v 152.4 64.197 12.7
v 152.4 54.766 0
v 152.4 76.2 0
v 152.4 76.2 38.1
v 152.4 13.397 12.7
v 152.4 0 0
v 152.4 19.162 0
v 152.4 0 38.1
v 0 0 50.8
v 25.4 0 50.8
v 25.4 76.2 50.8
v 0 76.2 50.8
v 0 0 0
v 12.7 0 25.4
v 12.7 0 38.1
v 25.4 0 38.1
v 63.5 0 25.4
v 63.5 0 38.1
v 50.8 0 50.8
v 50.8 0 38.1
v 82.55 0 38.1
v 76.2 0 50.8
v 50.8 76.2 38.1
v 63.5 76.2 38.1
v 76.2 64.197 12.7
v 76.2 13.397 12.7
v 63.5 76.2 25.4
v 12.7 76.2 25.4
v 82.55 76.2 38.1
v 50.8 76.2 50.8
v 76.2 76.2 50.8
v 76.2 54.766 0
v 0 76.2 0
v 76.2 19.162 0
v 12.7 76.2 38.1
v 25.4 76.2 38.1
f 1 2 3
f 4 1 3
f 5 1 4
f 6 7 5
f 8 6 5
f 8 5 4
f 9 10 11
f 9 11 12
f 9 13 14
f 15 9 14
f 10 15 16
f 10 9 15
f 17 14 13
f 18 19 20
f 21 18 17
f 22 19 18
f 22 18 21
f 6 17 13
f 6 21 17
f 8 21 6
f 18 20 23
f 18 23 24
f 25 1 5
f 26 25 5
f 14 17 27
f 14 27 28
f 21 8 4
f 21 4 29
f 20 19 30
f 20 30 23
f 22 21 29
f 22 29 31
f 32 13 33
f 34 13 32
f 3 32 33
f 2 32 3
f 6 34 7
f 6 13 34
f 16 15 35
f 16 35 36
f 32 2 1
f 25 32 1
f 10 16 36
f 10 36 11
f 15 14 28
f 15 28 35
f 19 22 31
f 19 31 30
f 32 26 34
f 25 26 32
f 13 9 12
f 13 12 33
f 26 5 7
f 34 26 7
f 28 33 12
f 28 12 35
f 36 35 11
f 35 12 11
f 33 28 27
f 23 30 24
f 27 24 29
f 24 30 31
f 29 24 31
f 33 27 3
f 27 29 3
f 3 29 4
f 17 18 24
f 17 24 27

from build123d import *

# Parameters (mm, degrees)
F1_DEPTH = 76.2
F3_DEPTH = 76.2


with BuildPart() as f1:
    # F0 (on Front) → F1 (new body)
    with BuildSketch(Plane.XZ):
        Polygon((0, 50.8), (0, 0), (152.4, 0), (152.4, 38.1), (82.55, 38.1), (76.2, 50.8), (50.8, 50.8), (50.8, 38.1), (63.5, 38.1), (63.5, 25.4), (12.7, 25.4), (12.7, 38.1), (25.4, 38.1), (25.4, 50.8), align=None)
    extrude(amount=-F1_DEPTH)

    # F2 (on face) → F3 (cut)
    with BuildSketch(Plane.YZ.offset(152.4)):
        Polygon((13.39724, 12.7), (19.161692, 0), (54.76566, 0), (64.19724, 12.7), align=None)
    extrude(amount=-F3_DEPTH, mode=Mode.SUBTRACT)


solid = f1.part
